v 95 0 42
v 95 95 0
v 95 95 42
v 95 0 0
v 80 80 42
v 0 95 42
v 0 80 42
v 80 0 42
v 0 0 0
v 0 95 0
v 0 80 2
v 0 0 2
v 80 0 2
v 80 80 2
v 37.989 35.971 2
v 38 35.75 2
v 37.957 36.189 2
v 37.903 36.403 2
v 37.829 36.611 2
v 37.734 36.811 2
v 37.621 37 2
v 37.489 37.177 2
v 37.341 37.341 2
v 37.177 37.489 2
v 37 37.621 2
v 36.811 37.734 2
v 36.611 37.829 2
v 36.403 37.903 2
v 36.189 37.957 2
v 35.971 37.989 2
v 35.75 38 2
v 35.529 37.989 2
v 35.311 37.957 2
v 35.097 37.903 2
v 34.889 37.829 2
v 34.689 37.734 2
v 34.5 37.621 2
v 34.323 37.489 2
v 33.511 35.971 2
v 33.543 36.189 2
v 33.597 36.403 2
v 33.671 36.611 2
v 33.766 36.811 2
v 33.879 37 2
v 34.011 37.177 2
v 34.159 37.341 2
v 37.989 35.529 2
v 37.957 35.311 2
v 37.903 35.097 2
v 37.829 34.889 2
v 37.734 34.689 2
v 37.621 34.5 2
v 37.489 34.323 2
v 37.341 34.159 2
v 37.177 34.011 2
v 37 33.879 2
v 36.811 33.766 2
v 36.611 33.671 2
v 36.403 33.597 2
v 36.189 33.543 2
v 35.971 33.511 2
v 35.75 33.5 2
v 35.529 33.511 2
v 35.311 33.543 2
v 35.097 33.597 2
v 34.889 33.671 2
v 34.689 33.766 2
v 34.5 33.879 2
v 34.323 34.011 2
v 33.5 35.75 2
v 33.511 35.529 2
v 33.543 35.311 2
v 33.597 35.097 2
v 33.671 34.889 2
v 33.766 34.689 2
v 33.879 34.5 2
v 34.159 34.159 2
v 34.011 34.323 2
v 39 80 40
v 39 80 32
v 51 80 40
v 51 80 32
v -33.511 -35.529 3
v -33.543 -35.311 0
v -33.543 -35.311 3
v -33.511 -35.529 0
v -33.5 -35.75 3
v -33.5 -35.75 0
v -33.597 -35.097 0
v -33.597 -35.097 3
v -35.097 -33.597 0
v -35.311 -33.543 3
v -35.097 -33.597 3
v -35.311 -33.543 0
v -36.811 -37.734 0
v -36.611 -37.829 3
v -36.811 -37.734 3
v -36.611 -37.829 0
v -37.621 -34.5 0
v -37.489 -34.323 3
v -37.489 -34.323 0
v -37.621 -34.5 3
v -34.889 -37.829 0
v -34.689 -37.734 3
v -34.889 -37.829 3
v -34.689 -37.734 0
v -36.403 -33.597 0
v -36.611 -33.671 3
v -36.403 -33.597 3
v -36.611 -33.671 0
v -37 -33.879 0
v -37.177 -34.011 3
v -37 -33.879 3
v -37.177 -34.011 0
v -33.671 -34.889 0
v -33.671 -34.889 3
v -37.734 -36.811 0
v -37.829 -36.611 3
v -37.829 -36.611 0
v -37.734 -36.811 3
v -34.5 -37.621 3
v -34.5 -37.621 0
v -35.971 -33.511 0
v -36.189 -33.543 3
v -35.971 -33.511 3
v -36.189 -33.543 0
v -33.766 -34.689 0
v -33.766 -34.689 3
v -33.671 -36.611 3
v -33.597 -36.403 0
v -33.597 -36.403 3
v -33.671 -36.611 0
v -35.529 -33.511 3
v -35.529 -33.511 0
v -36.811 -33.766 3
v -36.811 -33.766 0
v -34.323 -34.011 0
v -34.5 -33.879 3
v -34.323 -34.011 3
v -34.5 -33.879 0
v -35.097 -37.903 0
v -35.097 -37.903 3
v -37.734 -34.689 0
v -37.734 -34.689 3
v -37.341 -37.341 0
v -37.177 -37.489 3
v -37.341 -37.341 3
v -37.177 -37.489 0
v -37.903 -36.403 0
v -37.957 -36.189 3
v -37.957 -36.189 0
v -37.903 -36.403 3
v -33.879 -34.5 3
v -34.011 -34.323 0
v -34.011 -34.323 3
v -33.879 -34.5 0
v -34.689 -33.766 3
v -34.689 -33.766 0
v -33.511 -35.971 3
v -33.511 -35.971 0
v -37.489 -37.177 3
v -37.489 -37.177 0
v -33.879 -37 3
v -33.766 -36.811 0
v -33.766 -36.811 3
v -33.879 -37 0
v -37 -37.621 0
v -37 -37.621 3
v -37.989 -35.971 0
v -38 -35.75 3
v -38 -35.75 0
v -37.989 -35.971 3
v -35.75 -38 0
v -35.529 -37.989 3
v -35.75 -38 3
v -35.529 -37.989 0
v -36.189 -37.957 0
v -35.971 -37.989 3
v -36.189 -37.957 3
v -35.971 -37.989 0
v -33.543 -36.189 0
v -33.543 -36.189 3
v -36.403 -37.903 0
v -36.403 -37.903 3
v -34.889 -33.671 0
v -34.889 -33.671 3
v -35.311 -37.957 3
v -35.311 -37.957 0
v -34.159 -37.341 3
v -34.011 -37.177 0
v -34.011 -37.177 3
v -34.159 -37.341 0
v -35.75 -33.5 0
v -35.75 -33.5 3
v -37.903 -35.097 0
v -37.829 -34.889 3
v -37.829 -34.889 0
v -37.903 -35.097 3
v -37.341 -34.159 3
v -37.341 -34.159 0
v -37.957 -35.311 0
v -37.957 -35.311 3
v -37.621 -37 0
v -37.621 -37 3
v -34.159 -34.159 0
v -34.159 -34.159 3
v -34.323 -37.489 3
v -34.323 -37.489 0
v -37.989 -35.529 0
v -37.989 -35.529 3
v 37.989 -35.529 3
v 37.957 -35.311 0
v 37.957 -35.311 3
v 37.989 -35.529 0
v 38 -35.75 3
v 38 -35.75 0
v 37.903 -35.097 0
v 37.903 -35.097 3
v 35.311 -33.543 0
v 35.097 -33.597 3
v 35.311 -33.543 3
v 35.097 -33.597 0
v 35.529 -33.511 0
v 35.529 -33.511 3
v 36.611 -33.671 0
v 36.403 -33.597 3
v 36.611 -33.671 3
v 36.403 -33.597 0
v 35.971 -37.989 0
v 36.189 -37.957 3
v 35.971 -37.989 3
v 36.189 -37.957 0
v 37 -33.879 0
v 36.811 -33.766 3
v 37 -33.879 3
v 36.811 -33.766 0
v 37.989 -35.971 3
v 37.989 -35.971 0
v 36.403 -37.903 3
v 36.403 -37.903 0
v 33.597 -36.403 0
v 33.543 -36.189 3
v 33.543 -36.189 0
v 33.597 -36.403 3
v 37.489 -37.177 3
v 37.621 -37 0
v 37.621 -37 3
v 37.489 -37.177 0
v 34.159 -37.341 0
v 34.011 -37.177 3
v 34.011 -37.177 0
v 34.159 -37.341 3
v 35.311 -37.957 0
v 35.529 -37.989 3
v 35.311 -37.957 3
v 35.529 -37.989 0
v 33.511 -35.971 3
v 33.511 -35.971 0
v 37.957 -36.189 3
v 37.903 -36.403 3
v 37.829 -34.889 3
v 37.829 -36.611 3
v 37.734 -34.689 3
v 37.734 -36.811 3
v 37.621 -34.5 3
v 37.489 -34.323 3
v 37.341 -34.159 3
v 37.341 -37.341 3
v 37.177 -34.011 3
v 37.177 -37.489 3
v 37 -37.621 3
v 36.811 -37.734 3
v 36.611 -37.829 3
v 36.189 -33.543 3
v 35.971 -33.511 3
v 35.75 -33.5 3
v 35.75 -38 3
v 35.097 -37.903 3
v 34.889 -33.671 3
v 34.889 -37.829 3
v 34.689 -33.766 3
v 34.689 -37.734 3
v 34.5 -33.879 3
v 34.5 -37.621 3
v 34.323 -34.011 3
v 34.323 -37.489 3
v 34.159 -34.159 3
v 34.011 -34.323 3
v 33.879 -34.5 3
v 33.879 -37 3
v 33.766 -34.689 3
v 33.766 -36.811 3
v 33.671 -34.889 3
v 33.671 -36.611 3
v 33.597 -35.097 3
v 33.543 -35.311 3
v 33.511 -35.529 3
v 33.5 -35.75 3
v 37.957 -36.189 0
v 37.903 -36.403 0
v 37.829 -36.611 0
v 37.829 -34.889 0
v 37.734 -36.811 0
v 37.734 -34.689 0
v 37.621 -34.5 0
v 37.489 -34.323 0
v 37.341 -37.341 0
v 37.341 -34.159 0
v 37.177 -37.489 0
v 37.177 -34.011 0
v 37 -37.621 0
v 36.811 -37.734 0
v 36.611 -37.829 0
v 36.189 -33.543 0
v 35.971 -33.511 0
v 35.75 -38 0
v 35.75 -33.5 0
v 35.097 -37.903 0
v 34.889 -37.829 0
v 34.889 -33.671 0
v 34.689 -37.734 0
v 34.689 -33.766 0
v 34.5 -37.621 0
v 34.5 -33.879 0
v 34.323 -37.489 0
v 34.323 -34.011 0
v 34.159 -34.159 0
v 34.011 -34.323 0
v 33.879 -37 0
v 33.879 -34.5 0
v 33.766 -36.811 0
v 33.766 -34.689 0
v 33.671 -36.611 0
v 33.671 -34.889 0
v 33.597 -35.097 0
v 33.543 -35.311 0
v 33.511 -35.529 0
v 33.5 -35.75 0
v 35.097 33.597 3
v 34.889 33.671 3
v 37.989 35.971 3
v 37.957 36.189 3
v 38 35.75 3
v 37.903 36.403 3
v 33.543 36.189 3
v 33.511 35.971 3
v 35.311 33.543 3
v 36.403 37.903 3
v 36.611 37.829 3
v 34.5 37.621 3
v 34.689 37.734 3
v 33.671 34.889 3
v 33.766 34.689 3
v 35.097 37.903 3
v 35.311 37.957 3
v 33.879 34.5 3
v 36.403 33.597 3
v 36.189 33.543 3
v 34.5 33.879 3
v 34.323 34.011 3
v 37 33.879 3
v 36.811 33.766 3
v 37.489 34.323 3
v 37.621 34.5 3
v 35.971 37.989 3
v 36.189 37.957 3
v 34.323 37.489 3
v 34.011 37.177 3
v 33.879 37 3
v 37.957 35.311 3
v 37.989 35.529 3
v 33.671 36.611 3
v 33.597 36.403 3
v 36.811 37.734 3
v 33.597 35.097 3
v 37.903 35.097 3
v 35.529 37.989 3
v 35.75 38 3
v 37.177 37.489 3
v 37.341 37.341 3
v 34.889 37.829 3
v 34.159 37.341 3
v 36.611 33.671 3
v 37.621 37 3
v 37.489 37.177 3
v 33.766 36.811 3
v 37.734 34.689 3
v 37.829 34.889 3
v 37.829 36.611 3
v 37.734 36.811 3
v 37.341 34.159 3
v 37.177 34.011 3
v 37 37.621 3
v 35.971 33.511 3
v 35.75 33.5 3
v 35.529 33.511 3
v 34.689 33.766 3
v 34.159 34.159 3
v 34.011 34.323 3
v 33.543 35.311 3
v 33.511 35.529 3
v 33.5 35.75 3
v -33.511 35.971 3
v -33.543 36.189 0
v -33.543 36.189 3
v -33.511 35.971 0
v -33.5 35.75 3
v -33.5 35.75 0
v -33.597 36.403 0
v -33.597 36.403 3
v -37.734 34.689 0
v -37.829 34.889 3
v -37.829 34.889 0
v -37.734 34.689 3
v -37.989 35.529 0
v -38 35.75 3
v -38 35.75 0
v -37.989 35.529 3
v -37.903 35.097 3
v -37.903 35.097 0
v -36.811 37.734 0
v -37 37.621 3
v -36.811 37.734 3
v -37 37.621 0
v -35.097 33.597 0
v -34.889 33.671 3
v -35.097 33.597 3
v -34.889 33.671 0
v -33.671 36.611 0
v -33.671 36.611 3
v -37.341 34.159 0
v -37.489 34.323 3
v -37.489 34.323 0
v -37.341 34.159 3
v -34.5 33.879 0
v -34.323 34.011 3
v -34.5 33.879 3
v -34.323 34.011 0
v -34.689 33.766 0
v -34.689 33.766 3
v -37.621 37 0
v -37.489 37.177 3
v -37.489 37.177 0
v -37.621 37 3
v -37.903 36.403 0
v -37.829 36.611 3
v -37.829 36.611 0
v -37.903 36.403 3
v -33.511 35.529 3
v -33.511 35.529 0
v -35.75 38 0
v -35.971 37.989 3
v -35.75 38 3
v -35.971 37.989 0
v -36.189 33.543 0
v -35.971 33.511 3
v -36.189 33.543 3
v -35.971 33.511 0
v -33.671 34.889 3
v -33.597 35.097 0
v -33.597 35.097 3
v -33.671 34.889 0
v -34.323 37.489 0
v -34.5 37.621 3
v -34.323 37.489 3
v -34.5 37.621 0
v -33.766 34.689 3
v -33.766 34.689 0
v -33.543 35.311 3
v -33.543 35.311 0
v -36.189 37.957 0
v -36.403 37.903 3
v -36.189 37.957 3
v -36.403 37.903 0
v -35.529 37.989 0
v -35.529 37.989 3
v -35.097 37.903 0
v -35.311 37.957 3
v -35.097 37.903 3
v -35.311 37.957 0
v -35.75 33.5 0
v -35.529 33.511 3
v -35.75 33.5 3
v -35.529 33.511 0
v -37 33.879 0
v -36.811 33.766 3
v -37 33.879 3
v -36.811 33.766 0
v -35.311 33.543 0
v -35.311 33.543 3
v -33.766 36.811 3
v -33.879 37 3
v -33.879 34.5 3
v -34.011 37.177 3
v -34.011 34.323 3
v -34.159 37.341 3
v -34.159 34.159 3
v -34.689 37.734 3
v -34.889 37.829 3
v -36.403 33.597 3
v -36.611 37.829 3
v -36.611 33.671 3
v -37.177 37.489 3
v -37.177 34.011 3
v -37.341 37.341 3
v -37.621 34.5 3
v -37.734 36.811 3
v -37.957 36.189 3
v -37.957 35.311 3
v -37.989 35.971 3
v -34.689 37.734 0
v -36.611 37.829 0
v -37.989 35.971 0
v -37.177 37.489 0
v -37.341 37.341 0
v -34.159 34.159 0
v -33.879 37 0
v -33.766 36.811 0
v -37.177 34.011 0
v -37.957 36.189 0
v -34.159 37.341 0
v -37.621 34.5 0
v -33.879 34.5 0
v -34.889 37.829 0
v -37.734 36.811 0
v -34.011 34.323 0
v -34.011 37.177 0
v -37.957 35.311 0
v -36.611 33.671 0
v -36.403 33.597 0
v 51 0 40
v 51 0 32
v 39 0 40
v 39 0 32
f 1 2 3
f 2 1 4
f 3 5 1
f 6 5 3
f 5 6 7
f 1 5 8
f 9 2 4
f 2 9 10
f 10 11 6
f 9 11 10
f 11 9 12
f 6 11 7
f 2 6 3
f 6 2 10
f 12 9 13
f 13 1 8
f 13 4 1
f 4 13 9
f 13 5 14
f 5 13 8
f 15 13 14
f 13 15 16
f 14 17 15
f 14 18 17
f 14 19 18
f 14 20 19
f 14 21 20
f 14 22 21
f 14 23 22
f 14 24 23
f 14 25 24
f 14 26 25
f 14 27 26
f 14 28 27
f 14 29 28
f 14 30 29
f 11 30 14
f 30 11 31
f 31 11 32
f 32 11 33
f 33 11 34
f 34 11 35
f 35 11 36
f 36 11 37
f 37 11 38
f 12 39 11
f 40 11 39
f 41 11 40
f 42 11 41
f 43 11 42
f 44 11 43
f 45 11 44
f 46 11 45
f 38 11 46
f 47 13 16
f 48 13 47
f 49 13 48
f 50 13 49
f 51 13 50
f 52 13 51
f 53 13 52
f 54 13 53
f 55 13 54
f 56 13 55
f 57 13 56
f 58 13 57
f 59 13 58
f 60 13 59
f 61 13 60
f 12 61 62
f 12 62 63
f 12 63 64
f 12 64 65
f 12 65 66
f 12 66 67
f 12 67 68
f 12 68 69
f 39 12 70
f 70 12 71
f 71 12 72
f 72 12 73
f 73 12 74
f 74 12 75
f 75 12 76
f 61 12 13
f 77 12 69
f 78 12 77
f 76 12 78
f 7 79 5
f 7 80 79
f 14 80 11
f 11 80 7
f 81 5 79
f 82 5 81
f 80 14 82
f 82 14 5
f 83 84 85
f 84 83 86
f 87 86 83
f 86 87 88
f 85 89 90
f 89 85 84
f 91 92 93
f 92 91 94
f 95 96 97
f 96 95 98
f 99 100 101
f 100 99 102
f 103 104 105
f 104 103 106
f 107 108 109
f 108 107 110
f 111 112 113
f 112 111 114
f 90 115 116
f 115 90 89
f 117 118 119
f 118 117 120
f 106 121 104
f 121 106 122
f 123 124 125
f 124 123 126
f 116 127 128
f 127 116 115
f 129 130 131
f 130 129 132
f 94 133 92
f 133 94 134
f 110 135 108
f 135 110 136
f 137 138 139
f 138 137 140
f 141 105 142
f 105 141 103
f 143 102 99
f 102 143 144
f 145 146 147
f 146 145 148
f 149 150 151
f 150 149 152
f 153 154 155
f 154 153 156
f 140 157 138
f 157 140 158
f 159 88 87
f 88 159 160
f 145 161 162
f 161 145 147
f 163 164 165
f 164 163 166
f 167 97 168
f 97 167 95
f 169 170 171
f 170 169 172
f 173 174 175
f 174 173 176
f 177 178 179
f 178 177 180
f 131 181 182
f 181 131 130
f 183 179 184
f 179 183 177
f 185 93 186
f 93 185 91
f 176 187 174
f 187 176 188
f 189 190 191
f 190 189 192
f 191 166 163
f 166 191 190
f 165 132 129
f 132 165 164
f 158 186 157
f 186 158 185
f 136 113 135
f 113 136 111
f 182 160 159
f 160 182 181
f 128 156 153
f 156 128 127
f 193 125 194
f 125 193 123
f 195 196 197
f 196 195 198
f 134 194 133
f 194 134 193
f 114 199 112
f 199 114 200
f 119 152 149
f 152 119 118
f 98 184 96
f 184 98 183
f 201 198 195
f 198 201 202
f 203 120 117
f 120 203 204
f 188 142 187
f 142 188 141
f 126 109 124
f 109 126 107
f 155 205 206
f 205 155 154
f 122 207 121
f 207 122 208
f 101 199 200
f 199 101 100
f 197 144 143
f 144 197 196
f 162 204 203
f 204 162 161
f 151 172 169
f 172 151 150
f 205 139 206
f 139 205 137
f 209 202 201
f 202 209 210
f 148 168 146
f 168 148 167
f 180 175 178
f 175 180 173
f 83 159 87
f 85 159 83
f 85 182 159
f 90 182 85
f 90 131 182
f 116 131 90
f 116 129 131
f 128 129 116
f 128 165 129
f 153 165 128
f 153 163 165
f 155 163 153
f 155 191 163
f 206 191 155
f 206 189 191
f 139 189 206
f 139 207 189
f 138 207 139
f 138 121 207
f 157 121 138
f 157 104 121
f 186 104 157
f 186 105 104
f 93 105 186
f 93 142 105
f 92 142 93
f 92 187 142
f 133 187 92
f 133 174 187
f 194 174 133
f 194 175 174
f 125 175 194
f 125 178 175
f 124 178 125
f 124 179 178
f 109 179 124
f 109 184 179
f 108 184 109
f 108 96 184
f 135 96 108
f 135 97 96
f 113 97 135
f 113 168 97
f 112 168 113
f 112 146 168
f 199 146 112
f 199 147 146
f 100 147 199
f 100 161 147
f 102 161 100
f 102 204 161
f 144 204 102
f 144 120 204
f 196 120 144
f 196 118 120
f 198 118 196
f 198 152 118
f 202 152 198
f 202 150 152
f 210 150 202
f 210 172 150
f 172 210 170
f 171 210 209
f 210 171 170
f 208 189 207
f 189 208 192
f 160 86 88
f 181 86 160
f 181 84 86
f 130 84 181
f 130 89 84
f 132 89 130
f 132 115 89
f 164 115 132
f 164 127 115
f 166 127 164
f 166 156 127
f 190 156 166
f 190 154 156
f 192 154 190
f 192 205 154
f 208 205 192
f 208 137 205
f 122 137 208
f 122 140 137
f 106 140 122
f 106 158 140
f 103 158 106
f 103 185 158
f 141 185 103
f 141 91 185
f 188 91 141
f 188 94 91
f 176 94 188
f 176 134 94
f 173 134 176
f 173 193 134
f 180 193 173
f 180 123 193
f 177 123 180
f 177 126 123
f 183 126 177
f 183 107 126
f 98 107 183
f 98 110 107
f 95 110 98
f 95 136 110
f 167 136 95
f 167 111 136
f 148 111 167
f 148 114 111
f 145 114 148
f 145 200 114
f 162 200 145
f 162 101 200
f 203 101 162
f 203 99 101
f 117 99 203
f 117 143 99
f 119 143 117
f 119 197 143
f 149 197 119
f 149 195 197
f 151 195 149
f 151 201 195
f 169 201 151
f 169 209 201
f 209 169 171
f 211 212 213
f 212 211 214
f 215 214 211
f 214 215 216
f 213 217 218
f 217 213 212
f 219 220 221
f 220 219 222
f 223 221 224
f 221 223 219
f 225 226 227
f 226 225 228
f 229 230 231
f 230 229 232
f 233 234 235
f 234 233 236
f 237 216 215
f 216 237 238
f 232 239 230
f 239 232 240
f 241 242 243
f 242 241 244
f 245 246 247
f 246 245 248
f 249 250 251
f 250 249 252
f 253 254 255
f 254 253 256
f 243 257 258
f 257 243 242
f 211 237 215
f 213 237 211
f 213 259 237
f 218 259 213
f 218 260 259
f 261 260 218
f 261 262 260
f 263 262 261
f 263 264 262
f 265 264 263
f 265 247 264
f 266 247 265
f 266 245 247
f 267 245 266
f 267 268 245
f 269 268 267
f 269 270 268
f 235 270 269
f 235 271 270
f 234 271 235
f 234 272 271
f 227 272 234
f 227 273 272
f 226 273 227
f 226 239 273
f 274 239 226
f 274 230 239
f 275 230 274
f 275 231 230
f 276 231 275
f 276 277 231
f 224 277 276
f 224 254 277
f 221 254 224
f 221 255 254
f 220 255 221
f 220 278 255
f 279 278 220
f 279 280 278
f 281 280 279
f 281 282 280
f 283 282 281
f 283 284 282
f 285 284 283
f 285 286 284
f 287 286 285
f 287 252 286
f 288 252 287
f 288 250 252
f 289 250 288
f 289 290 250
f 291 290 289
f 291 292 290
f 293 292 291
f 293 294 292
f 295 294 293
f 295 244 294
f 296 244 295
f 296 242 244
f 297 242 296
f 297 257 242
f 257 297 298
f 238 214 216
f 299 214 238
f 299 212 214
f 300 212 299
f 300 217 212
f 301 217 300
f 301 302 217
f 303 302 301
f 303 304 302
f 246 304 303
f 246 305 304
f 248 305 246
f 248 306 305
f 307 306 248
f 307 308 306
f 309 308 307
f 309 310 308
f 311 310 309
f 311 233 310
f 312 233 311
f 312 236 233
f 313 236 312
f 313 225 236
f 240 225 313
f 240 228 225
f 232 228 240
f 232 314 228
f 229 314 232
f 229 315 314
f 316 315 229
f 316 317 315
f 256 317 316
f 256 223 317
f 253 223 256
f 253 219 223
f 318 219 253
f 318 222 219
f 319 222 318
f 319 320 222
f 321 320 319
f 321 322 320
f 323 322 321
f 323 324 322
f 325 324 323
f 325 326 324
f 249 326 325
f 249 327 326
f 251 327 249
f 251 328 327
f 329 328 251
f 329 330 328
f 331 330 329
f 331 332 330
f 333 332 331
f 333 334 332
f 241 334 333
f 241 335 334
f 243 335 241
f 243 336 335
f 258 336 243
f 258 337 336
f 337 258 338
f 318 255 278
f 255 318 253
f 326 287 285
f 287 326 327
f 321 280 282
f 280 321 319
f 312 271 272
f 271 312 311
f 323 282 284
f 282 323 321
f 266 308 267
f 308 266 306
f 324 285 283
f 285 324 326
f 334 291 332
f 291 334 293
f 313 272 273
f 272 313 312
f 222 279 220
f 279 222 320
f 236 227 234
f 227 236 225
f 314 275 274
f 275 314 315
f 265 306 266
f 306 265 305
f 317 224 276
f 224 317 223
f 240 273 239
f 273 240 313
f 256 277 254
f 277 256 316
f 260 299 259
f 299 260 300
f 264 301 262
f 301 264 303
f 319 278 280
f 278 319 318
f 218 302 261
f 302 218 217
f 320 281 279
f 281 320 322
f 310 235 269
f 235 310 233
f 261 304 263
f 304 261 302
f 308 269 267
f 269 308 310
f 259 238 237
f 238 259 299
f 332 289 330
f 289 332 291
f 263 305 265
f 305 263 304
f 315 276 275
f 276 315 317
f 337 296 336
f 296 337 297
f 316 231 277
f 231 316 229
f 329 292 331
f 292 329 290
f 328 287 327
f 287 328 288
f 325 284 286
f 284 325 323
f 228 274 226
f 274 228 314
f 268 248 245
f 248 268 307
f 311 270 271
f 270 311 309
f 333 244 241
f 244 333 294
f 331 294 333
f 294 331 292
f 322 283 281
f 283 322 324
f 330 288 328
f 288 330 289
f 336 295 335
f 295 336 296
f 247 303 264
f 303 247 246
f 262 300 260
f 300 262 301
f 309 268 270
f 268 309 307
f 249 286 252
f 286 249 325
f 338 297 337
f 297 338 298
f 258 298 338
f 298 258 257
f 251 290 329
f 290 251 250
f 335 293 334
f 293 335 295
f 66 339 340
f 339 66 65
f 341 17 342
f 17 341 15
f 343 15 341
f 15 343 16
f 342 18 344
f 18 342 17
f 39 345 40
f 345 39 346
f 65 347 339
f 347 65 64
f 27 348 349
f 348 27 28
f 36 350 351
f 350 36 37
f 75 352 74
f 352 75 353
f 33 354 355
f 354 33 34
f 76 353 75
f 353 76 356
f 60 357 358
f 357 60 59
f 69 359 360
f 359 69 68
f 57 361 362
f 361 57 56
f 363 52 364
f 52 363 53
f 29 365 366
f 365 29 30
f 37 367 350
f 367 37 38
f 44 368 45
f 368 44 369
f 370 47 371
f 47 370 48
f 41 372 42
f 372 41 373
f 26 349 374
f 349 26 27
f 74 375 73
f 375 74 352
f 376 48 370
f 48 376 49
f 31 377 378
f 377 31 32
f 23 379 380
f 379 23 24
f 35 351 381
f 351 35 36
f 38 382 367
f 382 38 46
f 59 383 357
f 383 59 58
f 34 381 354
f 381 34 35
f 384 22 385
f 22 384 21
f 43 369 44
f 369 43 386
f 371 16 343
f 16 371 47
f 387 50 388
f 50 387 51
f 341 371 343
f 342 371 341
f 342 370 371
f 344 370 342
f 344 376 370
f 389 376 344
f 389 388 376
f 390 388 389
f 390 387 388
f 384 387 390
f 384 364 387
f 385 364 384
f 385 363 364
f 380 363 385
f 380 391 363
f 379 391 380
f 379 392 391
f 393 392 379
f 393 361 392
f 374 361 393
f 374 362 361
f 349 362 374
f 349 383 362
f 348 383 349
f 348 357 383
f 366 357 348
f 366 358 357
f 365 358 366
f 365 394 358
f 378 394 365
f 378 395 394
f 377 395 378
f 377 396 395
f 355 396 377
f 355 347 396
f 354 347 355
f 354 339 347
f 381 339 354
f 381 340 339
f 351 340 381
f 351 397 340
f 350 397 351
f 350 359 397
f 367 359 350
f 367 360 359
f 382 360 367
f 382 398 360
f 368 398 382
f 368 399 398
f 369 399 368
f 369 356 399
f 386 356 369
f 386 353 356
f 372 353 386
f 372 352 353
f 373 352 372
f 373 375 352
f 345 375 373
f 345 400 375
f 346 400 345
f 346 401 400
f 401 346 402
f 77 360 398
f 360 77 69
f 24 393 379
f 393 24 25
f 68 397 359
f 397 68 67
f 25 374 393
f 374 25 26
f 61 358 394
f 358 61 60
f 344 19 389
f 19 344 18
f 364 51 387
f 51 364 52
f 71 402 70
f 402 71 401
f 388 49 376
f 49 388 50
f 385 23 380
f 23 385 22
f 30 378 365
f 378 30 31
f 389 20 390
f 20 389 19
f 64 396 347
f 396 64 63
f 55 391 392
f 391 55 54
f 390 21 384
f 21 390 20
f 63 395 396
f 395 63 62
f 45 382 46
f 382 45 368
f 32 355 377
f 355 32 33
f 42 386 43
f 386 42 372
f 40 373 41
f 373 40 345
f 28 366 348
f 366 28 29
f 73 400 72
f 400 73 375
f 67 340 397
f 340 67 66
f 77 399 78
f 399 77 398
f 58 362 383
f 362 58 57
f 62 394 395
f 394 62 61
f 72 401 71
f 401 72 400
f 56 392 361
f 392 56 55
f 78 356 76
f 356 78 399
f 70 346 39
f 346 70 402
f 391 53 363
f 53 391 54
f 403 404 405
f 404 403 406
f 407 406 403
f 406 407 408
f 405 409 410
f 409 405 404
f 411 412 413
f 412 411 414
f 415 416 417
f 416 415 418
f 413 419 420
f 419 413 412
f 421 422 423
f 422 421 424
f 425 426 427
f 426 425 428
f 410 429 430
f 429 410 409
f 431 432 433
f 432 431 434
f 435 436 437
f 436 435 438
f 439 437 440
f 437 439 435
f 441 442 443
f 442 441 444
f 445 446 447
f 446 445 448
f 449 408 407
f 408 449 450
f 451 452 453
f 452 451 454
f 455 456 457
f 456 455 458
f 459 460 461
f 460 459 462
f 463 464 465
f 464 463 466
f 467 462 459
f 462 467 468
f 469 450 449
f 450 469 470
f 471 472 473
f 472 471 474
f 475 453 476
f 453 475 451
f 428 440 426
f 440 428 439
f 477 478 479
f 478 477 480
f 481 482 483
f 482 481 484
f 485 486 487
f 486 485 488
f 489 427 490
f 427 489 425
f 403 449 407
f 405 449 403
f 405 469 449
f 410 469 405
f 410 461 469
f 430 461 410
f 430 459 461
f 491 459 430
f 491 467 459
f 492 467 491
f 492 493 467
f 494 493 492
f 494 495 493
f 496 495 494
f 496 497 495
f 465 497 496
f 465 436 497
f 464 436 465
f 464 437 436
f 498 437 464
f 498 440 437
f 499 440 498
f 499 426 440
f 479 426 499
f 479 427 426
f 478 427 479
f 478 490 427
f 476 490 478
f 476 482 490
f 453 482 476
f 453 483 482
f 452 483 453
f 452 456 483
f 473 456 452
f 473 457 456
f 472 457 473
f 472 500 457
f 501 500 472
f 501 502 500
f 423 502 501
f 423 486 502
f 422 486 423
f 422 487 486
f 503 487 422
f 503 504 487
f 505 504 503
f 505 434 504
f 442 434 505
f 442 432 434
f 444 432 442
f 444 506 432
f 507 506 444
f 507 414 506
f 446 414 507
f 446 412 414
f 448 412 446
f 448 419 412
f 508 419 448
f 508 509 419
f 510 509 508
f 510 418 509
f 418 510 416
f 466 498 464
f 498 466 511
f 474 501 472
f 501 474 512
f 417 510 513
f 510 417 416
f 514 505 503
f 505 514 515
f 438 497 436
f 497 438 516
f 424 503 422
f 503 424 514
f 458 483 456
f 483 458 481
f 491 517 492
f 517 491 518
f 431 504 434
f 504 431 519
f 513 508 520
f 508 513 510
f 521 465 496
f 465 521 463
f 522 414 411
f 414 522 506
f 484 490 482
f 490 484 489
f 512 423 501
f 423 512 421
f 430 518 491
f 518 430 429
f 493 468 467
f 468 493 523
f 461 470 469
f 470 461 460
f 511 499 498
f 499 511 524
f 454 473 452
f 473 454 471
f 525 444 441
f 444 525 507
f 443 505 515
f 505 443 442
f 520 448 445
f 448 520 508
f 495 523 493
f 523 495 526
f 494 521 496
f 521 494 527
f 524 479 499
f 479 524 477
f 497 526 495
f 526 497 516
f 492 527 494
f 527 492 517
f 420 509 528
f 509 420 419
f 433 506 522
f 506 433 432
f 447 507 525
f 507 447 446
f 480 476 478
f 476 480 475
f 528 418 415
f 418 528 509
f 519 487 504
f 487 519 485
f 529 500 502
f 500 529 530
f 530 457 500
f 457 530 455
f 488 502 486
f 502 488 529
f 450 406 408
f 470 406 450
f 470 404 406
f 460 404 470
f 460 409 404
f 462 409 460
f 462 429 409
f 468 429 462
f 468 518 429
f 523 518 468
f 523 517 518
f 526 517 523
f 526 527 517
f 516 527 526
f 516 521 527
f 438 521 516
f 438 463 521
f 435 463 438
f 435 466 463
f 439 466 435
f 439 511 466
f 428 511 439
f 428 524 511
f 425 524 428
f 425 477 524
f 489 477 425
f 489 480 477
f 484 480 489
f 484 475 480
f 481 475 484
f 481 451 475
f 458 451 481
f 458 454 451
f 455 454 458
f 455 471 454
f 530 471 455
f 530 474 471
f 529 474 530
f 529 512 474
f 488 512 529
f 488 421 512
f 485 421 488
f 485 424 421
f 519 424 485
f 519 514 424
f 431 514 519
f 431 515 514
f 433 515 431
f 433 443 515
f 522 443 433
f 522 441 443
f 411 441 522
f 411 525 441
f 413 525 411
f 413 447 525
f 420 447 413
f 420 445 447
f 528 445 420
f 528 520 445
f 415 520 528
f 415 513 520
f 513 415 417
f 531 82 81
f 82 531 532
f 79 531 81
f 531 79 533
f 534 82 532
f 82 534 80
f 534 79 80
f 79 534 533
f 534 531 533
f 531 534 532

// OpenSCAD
// DIY Magnetic Stirrer Housing - designed for an 80mm PC fan.
// Orientation: Top plate on bed (z=0), walls rising to z=40.
// Outer size: 90x90mm. Fan size: 80x80mm.

// Dimensions
outer_size = 90;
fan_size   = 80;
wall_thickness = 2.5;
top_thickness = 2;
wall_height  = 40;

// Hole dimensions
screw_hole_d = 4.5;
screw_hole_pattern = 71.5;

// Notch dimensions
notch_width = 12;
notch_depth = 8; // reaches from z=32 to z=40

$fn = 64;

// Calculate positions
// Top plate is 90x90, centred on origin, sitting on z=0.
// Walls rise from the perimeter of the top plate.
// The inner void is 80x80.

module main_body() {
    // Create the solid block: Top plate + Walls
    // We build the outer shell and subtract the inner void.
    
    // Outer dimensions of the solid block (including walls)
    // The walls sit on top of the plate.
    // Plate is 90x90. Walls are 2.5mm thick.
    // So the total width/depth is 90 + 2.5 + 2.5 = 95mm.
    // Height is top_thickness + wall_height = 2 + 40 = 42mm.
    
    outer_w = outer_size + 2 * wall_thickness;
    outer_h = outer_size + 2 * wall_thickness;
    total_h = top_thickness + wall_height;
    
    // Inner void dimensions (the space for the fan)
    // The void starts at z = top_thickness.
    // The void width/depth is fan_size.
    inner_w = fan_size;
    inner_h = fan_size;
    void_z_start = top_thickness;
    void_z_end = total_h;
    
    difference() {
        // 1. The main solid block
        translate([0, 0, 0]) 
            cube([outer_w, outer_h, total_h]);
        
        // 2. The inner void (open box)
        // This void is a rectangular prism starting at z = top_thickness
        translate([0, 0, void_z_start]) 
            cube([inner_w, inner_h, void_z_end - void_z_start]);
    }
}

module screw_holes() {
    // Four holes on a 71.5mm square pattern centred on the plate.
    // The plate is 90x90. The pattern is centred.
    // Distance from centre to hole centre is 71.5 / 2 = 35.75.
    
    offset = screw_hole_pattern / 2;
    
    for (i = [0 : 3]) {
        // Determine X and Y offsets based on index
        // 0: -X, -Y
        // 1: +X, -Y
        // 2: +X, +Y
        // 3: -X, +Y
        if (i == 0) {
            translate([-offset, -offset, 0]) 
                cylinder(h = top_thickness + 1, d = screw_hole_d);
        } else if (i == 1) {
            translate([offset, -offset, 0]) 
                cylinder(h = top_thickness + 1, d = screw_hole_d);
        } else if (i == 2) {
            translate([offset, offset, 0]) 
                cylinder(h = top_thickness + 1, d = screw_hole_d);
        } else {
            translate([-offset, offset, 0]) 
                cylinder(h = top_thickness + 1, d = screw_hole_d);
        }
    }
}

module cable_notch() {
    // Notch in one wall.
    // 12mm wide, centred along the wall.
    // Reaches 8mm down from the open edge (z=32 to z=40).
    // Let's place it on the +Y wall (right side when looking from top).
    // The wall is at x = outer_size/2 = 45.
    // The notch goes from x = 45 - notch_width/2 to x = 45 + notch_width/2.
    // It goes from z = 32 to z = 40.
    
    wall_x = outer_size / 2;
    notch_x_start = wall_x - notch_width / 2;
    notch_x_end = wall_x + notch_width / 2;
    
    // Cut the notch
    translate([notch_x_start, 0, 32]) 
        cube([notch_width, outer_size + 2 * wall_thickness, notch_depth]);
}

// Main assembly
difference() {
    union() {
        main_body();
        screw_holes();
        cable_notch();
    }
}
